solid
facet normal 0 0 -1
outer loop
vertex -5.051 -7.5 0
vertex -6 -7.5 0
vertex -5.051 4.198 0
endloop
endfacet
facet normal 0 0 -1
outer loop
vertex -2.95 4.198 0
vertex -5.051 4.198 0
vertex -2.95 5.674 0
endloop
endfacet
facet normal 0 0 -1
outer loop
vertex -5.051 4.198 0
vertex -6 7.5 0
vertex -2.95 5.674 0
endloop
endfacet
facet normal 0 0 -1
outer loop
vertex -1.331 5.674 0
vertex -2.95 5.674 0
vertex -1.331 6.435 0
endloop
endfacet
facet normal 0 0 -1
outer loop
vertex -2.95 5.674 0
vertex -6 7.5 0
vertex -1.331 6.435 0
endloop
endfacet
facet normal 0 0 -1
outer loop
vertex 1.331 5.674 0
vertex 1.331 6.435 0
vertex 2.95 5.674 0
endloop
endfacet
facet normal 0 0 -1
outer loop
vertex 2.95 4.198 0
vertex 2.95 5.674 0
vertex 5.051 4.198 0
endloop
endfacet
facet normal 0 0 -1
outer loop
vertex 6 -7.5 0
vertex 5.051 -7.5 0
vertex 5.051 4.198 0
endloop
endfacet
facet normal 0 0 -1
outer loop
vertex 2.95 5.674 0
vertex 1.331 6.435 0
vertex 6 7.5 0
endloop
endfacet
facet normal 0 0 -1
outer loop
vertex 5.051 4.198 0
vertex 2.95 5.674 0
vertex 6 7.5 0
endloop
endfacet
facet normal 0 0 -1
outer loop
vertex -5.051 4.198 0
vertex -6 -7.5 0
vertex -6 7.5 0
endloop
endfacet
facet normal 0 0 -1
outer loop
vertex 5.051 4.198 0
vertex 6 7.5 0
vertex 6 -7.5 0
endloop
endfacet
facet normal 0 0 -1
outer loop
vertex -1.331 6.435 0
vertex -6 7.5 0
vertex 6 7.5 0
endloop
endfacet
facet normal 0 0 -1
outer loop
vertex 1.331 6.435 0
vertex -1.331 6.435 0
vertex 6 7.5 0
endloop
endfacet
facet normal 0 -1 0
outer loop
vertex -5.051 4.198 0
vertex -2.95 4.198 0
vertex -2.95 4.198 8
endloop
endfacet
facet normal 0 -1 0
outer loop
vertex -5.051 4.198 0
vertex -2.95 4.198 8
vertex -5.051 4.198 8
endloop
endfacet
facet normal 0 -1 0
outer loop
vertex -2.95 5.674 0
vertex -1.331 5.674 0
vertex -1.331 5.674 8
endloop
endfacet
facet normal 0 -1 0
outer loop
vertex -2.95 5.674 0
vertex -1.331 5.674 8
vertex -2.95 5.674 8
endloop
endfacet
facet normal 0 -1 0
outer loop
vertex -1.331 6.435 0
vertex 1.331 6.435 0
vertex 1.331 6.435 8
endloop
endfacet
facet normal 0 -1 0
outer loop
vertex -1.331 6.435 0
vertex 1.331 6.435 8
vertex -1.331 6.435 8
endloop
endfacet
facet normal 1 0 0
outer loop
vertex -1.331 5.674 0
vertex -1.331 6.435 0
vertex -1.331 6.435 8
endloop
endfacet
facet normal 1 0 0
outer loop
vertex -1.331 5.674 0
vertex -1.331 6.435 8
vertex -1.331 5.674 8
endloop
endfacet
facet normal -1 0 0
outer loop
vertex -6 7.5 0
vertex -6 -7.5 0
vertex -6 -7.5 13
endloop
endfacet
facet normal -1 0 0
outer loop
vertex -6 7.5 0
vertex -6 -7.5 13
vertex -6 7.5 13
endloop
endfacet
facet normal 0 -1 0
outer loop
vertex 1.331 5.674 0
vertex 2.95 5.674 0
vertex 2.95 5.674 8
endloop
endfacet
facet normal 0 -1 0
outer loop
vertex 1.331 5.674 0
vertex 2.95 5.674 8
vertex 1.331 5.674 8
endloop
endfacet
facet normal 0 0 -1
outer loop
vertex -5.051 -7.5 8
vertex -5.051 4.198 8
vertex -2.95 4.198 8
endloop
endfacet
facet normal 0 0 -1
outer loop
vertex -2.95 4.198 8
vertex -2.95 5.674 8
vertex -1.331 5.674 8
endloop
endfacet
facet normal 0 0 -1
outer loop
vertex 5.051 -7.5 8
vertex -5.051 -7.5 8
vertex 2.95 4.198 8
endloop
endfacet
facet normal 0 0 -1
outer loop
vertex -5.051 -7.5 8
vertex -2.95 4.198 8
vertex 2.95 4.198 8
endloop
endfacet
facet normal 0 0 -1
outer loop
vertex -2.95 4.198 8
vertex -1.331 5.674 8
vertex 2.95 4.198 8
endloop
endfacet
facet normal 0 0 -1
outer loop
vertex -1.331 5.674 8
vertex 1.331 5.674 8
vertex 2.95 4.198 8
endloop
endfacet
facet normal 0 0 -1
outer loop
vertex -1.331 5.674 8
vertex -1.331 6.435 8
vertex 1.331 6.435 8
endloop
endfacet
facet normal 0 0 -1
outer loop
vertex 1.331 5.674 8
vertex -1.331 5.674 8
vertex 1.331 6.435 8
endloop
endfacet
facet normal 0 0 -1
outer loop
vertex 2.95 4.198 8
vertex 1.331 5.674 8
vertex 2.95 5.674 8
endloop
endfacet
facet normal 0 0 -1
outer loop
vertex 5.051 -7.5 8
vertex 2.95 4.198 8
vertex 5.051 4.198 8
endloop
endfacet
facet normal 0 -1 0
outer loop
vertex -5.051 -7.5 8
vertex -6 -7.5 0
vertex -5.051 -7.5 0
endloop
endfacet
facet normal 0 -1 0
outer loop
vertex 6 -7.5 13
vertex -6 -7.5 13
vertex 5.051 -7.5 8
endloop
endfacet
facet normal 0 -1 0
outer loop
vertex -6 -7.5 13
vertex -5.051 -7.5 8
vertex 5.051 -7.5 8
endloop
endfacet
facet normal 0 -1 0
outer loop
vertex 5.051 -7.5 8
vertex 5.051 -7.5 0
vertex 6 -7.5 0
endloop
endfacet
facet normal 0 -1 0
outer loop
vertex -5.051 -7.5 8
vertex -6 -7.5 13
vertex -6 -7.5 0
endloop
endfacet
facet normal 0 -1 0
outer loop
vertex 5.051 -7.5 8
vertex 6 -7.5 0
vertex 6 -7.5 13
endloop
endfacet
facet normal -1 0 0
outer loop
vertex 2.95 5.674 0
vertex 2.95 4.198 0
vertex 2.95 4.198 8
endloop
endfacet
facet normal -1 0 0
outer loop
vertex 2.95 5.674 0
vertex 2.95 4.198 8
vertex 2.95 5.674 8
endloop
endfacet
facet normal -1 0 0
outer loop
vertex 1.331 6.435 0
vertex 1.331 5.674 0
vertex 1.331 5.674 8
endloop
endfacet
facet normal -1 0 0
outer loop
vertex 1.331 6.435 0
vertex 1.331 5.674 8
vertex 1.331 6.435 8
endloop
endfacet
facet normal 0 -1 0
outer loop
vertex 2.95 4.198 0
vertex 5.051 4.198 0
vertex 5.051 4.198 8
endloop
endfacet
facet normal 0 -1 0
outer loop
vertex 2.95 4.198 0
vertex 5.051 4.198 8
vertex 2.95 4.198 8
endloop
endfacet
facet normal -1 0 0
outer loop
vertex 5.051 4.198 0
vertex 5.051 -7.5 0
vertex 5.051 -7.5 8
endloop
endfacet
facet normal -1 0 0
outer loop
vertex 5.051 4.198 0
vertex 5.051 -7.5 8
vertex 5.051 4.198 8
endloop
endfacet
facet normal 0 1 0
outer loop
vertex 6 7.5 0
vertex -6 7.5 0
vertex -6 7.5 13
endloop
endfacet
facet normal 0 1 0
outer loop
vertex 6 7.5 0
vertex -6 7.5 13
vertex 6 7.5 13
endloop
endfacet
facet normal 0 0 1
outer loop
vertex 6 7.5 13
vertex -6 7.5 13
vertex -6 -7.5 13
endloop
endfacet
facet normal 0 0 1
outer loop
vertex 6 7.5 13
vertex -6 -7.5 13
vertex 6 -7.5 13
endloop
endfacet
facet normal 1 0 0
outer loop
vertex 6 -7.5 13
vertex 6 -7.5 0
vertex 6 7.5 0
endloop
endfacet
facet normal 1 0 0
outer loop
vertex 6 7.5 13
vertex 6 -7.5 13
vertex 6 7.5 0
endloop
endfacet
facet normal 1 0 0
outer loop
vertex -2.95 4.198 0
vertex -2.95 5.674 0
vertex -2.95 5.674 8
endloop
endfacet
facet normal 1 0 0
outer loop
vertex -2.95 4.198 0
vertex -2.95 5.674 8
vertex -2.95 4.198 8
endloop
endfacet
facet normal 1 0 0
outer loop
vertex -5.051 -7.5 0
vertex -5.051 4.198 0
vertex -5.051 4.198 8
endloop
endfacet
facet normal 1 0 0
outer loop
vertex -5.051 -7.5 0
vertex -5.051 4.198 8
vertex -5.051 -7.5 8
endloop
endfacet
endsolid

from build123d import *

# Parameters (mm, degrees)
SKETCH1_W           = 12
SKETCH1_H           = 15
BOSS_EXTRUDE1_DEPTH = 13
CUT_EXTRUDE1_DEPTH  = 8


with BuildPart() as part:
    # Sketch1 → Boss-Extrude1 (new body)
    with BuildSketch(Plane.XY):
        Rectangle(SKETCH1_W, SKETCH1_H)
    extrude(amount=BOSS_EXTRUDE1_DEPTH)

    # Sketch2 → Cut-Extrude1 (cut)
    with BuildSketch(Plane.XY):
        Polygon((1.331268312, 6.434952315), (-1.331268312, 6.434952315), (-1.331268312, 5.674031135), (-2.949806732, 5.674031135), (-2.949806732, 4.197823958), (-5.051214446, 4.197823958), (-5.051214446, -7.5), (5.051214446, -7.5), (5.051214446, 4.197823958), (2.949806732, 4.197823958), (2.949806732, 5.674031135), (1.331268312, 5.674031135), align=None)
    extrude(amount=CUT_EXTRUDE1_DEPTH, mode=Mode.SUBTRACT)


solid = part.part
